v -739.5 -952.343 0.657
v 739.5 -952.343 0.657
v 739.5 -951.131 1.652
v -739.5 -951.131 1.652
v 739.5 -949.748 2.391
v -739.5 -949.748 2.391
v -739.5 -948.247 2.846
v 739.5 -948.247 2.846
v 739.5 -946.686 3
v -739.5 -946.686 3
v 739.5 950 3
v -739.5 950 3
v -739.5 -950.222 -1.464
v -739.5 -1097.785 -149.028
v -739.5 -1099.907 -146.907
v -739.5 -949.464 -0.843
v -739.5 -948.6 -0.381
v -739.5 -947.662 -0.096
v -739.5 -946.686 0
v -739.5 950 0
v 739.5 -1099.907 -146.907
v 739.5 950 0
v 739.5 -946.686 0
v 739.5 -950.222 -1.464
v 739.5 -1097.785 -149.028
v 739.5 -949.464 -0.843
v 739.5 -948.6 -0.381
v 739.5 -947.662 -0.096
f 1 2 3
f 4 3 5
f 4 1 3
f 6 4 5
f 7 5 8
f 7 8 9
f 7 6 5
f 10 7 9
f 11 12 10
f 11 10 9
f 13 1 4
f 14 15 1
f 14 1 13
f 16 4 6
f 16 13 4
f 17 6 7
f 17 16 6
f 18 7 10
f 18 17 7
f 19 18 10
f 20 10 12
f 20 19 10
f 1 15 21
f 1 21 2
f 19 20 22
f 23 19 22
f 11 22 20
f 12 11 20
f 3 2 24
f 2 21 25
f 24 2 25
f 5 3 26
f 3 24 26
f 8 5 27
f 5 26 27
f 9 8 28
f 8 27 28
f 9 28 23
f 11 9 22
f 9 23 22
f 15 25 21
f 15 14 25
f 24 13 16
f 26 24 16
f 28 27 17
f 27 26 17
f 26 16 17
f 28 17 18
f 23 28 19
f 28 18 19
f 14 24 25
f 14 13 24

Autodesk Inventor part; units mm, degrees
ref_plane "YZ Plane" through (0, 0, 0) normal (1, 0, 0) x (0, 1, 0)
ref_plane "XZ Plane" through (0, 0, 0) normal (0, 1, 0) x (-1, 0, 0)
ref_plane "XY Plane" through (0, 0, 0) normal (0, 0, 1) x (1, 0, 0)
sketch "Sketch1" plane through (0, 0, 0) normal (0, 0, 1) x (1, 0, 0)
  line L0 (-739.5, -950) -> (739.5, -950)
  line L1 (739.5, -950) -> (739.5, 950)
  line L2 (739.5, 950) -> (-739.5, 950)
  line L3 (-739.5, 950) -> (-739.5, -950)
  line L4 (-739.5, -950) -> (739.5, 950) construction
  line L5 (739.5, -950) -> (-739.5, 950) construction
  point P0 (0, 0)
  dimension "d0" = 1479
  dimension "d1" = 1900
extrude "Plate1" add sketch "Sketch1" along normal blind 3
sketch "Sketch3" plane through (-739.5, -947.8787, 0.8787) normal (0, -0.7071068, 0.7071068) x (1, 0, 0)
  line L0 (1479, 0) -> (0, 0)
  line L1 (0, 0) -> (0, -212)
  line L2 (0, -212) -> (1479, -212)
  line L3 (1479, -212) -> (1479, 0)
edge flange "Flange2" height 212 angle 45 thickness 3 bend radius 5 thickness toward (0, -0.7071068, 0.7071068) relief round relief width 3 relief depth 1.5 edges at (0, -950, 0) wall of the first edge with corners at (739.5, -947.8787, 0.8787) (-739.5, -947.8787, 0.8787) (-739.5, -1097.7853, -149.028) (739.5, -1097.7853, -149.028)
bend "Bend2"
corner "Corner2"
sketch "Sketch4" plane through (739.5, -1097.7853, -149.028) normal (0, 0.7071068, -0.7071068) x (-1, 0, 0)
  line L0 (1454, 36.661) -> (1454, 25) construction
  line L1 (1454, 25) -> (1254, 25) construction
  line L2 (1254, 25) -> (1254, 36.661) construction
  line L3 (1254, 36.661) -> (1454, 36.661) construction
  line L4 (0, 0) -> (1479, 0) projected
  line L5 (1479, 208.6863) -> (1479, 0) projected
  point P0 (739.5, 881.6301)
  point P1 (1454, 30.8305)
  dimension "d23" = 200
  dimension "d24" = 11.661
  dimension "d25" = 25
  dimension "d26" = 25
mark "Mark1"
equation "\"d2\" = Thickness"
equation "\"d13\" = BendReliefWidth"
equation "\"d14\" = BendReliefDepth"
equation "\"d15\" = MinimumRemnant"
equation "\"d16\" = TransitionRadius"
equation "\"d19\" = BendRadius"
equation "\"d20\" = CornerReliefSize"
equation "\"d21\" = GapSize"
equation "\"d22\" = JacobiRadiusSize"
equation "\"BendReliefWidth\" = Thickness"
equation "\"BendReliefDepth\" = 0.5 * Thickness"
equation "\"CornerReliefSize\" = 4 * Thickness"
equation "\"MinimumRemnant\" = 2 * Thickness"
equation "\"TransitionRadius\" = BendRadius"
equation "\"JacobiRadiusSize\" = BendRadius"
equation "\"GapSize\" = Thickness"
equation "\"Thickness\" = 3"
equation "\"BendRadius\" = 5"
properties part number "BSH 012 floor" material "09g2s"
